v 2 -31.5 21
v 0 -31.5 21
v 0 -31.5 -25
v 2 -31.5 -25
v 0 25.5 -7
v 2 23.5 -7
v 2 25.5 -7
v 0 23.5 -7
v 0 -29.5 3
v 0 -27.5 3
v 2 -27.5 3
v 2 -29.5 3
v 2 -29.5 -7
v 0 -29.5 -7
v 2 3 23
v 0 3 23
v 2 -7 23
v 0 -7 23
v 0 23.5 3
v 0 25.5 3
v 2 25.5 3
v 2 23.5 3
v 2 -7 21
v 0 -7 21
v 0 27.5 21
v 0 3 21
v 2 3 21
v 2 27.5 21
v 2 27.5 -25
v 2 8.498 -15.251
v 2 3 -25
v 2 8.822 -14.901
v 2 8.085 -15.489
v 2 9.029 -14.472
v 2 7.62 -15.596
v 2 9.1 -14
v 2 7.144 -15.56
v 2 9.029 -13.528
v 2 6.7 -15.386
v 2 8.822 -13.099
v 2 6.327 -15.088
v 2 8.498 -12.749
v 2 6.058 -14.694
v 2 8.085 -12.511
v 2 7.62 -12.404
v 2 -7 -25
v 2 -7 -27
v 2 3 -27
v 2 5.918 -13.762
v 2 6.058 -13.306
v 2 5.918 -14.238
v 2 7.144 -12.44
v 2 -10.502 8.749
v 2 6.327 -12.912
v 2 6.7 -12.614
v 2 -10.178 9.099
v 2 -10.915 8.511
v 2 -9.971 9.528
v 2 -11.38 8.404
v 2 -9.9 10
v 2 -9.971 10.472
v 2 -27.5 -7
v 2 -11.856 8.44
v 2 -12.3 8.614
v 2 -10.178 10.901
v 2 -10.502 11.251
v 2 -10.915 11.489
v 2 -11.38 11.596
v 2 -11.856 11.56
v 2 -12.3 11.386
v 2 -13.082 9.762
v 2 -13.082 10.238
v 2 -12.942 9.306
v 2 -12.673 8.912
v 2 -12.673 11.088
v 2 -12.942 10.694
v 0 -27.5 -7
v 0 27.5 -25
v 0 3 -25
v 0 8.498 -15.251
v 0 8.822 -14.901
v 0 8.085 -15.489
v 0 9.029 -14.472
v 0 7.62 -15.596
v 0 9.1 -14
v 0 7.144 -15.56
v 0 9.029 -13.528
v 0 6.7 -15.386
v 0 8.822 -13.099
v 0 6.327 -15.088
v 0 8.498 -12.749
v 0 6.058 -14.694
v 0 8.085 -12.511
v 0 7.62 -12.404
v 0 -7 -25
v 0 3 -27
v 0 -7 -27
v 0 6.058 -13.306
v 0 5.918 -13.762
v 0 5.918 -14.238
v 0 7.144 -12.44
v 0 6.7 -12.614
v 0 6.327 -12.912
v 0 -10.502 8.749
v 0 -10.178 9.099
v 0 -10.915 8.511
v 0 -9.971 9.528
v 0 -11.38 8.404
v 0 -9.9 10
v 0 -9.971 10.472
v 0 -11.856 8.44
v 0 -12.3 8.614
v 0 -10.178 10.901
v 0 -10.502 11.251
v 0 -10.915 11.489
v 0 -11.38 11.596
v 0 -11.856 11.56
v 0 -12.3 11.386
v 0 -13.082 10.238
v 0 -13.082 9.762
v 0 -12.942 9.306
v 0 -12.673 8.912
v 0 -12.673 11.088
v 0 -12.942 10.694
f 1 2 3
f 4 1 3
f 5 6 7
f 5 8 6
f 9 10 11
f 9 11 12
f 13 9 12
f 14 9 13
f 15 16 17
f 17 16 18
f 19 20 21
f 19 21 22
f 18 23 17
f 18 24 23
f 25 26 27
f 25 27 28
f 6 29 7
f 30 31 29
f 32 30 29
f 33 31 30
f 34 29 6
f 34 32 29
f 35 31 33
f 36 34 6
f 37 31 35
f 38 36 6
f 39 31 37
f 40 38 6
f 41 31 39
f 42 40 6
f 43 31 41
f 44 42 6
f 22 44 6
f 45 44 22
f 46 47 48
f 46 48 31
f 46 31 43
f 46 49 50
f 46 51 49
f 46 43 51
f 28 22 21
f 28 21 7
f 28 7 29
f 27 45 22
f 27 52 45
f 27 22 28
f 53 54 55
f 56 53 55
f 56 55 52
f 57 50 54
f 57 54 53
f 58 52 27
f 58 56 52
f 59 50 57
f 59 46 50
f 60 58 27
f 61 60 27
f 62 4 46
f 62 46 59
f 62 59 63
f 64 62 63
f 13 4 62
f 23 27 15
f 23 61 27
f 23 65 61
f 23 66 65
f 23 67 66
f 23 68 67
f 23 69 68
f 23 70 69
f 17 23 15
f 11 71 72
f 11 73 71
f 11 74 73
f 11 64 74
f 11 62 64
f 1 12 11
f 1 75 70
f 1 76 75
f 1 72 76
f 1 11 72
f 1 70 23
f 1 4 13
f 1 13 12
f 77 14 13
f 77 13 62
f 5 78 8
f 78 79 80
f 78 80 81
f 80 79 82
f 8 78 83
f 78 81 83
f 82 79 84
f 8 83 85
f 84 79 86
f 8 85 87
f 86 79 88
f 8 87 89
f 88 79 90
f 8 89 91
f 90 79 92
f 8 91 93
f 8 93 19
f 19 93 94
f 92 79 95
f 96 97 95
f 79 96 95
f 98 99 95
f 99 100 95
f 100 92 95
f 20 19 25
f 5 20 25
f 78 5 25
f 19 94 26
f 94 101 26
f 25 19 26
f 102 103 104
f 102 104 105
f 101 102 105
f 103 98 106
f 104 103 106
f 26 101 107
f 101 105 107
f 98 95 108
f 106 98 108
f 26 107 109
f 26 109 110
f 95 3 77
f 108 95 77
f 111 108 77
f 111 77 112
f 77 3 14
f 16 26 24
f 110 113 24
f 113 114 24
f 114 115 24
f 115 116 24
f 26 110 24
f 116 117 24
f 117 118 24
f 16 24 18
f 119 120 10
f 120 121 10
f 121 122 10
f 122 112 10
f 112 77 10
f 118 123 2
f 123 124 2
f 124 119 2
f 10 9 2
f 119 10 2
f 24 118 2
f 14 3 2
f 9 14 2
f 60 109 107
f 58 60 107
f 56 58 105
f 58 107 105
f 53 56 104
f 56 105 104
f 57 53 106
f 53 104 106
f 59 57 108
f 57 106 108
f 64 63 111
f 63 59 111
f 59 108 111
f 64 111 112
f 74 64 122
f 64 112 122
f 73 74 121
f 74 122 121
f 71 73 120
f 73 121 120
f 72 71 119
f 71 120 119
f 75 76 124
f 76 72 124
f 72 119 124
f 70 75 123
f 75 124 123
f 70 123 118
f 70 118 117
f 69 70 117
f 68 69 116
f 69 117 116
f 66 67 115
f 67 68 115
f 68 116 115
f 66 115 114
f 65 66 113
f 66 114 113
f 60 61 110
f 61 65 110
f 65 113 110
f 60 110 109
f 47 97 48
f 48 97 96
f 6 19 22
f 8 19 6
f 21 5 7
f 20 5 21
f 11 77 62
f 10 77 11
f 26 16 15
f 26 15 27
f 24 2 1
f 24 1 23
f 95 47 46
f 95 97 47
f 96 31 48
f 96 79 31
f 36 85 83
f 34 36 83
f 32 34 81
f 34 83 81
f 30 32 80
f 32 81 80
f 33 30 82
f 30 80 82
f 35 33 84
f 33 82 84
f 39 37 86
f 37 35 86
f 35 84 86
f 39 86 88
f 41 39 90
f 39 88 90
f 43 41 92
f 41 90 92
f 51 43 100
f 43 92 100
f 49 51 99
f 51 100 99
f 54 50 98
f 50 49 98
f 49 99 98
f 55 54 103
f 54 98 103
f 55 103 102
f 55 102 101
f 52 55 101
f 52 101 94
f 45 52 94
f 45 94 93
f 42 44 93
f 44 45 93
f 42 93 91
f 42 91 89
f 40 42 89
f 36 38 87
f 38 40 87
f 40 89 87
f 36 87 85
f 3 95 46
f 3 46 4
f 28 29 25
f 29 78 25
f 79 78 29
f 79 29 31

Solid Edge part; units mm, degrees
sketch "Sketch1" plane through (0, 0, 0) normal (1, 0, 0) x (0, 1, 0)
  line L0 (27.5, -27) -> (27.5, 23)
  line L1 (27.5, 23) -> (-31.5, 23)
  line L2 (-31.5, 23) -> (-31.5, -27)
  line L3 (-31.5, -27) -> (27.5, -27)
extrude "Protrusion1" add sketch "Sketch1" along normal blind 2
sketch "Sketch2" plane through (0, 0, 0) normal (1, 0, 0) x (0, 1, 0)
  line L0 (-31.5, 21) -> (-7, 21)
  line L1 (-7, 21) -> (-7, 23)
  line L2 (-7, 23) -> (-31.5, 23)
  line L3 (-31.5, 23) -> (-31.5, 21)
extrude "ExtrudedCutout_1" cut sketch "Sketch2" along normal blind 2
sketch "Sketch3" plane through (0, 0, 0) normal (1, 0, 0) x (0, 1, 0)
  line L0 (3, 21) -> (27.5, 21)
  line L1 (27.5, 21) -> (27.5, 23)
  line L2 (27.5, 23) -> (3, 23)
  line L3 (3, 23) -> (3, 21)
extrude "ExtrudedCutout_2" cut sketch "Sketch3" along normal blind 2
sketch "Sketch4" plane through (0, 0, 0) normal (1, 0, 0) x (0, 1, 0)
  line L0 (23.5, 3) -> (23.5, -7)
  line L1 (23.5, -7) -> (25.5, -7)
  line L2 (25.5, -7) -> (25.5, 3)
  line L3 (25.5, 3) -> (23.5, 3)
extrude "ExtrudedCutout_3" cut sketch "Sketch4" along normal blind 2
sketch "Sketch5" plane through (0, 0, 0) normal (1, 0, 0) x (0, 1, 0)
  line L0 (27.5, -25) -> (3, -25)
  line L1 (3, -25) -> (3, -27)
  line L2 (3, -27) -> (27.5, -27)
  line L3 (27.5, -27) -> (27.5, -25)
extrude "ExtrudedCutout_4" cut sketch "Sketch5" along normal blind 4
sketch "Sketch6" plane through (0, 0, 0) normal (1, 0, 0) x (0, 1, 0)
  line L0 (-7, -25) -> (-31.5, -25)
  line L1 (-31.5, -25) -> (-31.5, -27)
  line L2 (-31.5, -27) -> (-7, -27)
  line L3 (-7, -27) -> (-7, -25)
extrude "ExtrudedCutout_5" cut sketch "Sketch6" along normal blind 2
sketch "Sketch7" plane through (0, 0, 0) normal (1, 0, 0) x (0, 1, 0)
  line L0 (-29.5, -7) -> (-27.5, -7)
  line L1 (-27.5, -7) -> (-27.5, 3)
  line L2 (-27.5, 3) -> (-29.5, 3)
  line L3 (-29.5, 3) -> (-29.5, -7)
extrude "ExtrudedCutout_6" cut sketch "Sketch7" along normal blind 4
sketch "Sketch8" plane through (0, 0, 0) normal (1, 0, 0) x (0, 1, 0)
  circle A0 centre (-11.5, 10) radius 1.6
  circle A1 centre (7.5, -14) radius 1.6
  dimension "D1" = 3.2
  dimension "D2" = 3.2
  dimension "D3" = 3.5
  dimension "D4" = 3.5
  dimension "D5" = 3.5
  dimension "D6" = 3.5
extrude "ExtrudedCutout_7" cut sketch "Sketch8" along normal blind 2
properties material "Acrylic, high impact grade"
